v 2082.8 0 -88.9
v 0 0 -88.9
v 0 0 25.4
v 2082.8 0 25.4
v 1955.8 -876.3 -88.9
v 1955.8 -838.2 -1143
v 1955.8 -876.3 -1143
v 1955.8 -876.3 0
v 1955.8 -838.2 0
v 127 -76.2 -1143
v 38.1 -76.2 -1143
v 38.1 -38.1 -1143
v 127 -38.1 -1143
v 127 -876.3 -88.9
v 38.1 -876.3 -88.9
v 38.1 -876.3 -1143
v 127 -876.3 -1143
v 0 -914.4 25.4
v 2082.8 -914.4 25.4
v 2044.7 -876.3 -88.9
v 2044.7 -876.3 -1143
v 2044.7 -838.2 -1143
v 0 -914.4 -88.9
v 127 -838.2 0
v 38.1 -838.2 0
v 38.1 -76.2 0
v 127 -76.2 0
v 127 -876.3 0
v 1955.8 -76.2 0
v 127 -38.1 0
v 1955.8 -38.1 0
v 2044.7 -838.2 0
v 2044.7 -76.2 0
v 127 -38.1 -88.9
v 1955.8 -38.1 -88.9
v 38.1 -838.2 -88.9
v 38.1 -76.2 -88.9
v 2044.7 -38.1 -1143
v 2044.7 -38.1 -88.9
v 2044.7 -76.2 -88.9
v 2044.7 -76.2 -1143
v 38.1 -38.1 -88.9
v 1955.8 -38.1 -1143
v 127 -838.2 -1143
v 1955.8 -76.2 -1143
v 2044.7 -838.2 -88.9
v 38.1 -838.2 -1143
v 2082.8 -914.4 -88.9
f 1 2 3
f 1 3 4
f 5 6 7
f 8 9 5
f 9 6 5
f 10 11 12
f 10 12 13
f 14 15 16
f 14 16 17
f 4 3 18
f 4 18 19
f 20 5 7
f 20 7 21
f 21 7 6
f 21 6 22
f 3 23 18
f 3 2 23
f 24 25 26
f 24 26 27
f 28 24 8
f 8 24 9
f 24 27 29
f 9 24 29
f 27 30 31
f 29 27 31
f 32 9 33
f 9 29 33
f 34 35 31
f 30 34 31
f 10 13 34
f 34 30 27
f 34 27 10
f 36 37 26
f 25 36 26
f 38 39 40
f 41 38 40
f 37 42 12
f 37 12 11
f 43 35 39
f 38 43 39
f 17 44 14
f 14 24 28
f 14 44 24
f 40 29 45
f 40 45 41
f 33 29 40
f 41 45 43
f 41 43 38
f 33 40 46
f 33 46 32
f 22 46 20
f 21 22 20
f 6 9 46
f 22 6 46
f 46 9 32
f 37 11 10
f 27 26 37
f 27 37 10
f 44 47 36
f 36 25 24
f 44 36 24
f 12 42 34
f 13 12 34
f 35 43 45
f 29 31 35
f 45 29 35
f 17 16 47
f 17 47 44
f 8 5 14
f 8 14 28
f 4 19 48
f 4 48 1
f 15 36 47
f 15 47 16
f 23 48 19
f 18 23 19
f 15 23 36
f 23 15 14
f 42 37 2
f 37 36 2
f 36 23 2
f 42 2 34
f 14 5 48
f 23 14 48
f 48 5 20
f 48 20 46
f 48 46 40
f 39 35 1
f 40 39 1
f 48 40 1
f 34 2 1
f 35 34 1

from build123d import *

# Parameters (mm, degrees)
F0_W     = 2082.8
F0_H     = 914.4
F1_DEPTH = 25.4
F2_W     = 38.1
F2_H     = 88.9
F3_DEPTH = 2082.8
F4_W     = 38.1
F4_H     = 88.9
F5_DEPTH = 838.2
F6_W     = 88.9
F6_H     = 38.1
F7_DEPTH = 1143


# Not quite as in the source:
# - a feature names something its author has since deleted; it is built from what else it names


with BuildPart() as f1:
    # F0 (on Top) → F1 (new body)
    with BuildSketch(Plane.XY):
        with Locations((1041.4, -457.2)):
            Rectangle(F0_W, F0_H)
    extrude(amount=F1_DEPTH)

    # F2 (on face) → F3 (join, through all)
    with BuildSketch(Plane.YZ.offset(2082.8)):
        with Locations((-895.35, -44.45)):
            Rectangle(F2_W, F2_H)
        with Locations((-19.05, -44.45)):
            Rectangle(F2_W, F2_H)
    extrude(amount=-F3_DEPTH)

    # F4 (on face) → F5 (join, through all)
    with BuildSketch(Plane.XZ.offset(38.1)):
        with Locations((19.05, -44.45)):
            Rectangle(F4_W, F4_H)
        with Locations((2063.75, -44.45)):
            Rectangle(F4_W, F4_H)
    extrude(amount=F5_DEPTH)

    # F6 (on face) → F7 (join)
    with BuildSketch(Plane(origin=(0, 0, 0), x_dir=(1, 0, 0), z_dir=(0, 0, -1))):
        with Locations((82.55, 857.25)):
            Rectangle(F6_W, F6_H)
        with Locations((82.55, 57.15)):
            Rectangle(F6_W, F6_H)
        with Locations((2000.25, 57.15)):
            Rectangle(F6_W, F6_H)
        with Locations((2000.25, 857.25)):
            Rectangle(F6_W, F6_H)
    extrude(amount=F7_DEPTH)


solid = f1.part
